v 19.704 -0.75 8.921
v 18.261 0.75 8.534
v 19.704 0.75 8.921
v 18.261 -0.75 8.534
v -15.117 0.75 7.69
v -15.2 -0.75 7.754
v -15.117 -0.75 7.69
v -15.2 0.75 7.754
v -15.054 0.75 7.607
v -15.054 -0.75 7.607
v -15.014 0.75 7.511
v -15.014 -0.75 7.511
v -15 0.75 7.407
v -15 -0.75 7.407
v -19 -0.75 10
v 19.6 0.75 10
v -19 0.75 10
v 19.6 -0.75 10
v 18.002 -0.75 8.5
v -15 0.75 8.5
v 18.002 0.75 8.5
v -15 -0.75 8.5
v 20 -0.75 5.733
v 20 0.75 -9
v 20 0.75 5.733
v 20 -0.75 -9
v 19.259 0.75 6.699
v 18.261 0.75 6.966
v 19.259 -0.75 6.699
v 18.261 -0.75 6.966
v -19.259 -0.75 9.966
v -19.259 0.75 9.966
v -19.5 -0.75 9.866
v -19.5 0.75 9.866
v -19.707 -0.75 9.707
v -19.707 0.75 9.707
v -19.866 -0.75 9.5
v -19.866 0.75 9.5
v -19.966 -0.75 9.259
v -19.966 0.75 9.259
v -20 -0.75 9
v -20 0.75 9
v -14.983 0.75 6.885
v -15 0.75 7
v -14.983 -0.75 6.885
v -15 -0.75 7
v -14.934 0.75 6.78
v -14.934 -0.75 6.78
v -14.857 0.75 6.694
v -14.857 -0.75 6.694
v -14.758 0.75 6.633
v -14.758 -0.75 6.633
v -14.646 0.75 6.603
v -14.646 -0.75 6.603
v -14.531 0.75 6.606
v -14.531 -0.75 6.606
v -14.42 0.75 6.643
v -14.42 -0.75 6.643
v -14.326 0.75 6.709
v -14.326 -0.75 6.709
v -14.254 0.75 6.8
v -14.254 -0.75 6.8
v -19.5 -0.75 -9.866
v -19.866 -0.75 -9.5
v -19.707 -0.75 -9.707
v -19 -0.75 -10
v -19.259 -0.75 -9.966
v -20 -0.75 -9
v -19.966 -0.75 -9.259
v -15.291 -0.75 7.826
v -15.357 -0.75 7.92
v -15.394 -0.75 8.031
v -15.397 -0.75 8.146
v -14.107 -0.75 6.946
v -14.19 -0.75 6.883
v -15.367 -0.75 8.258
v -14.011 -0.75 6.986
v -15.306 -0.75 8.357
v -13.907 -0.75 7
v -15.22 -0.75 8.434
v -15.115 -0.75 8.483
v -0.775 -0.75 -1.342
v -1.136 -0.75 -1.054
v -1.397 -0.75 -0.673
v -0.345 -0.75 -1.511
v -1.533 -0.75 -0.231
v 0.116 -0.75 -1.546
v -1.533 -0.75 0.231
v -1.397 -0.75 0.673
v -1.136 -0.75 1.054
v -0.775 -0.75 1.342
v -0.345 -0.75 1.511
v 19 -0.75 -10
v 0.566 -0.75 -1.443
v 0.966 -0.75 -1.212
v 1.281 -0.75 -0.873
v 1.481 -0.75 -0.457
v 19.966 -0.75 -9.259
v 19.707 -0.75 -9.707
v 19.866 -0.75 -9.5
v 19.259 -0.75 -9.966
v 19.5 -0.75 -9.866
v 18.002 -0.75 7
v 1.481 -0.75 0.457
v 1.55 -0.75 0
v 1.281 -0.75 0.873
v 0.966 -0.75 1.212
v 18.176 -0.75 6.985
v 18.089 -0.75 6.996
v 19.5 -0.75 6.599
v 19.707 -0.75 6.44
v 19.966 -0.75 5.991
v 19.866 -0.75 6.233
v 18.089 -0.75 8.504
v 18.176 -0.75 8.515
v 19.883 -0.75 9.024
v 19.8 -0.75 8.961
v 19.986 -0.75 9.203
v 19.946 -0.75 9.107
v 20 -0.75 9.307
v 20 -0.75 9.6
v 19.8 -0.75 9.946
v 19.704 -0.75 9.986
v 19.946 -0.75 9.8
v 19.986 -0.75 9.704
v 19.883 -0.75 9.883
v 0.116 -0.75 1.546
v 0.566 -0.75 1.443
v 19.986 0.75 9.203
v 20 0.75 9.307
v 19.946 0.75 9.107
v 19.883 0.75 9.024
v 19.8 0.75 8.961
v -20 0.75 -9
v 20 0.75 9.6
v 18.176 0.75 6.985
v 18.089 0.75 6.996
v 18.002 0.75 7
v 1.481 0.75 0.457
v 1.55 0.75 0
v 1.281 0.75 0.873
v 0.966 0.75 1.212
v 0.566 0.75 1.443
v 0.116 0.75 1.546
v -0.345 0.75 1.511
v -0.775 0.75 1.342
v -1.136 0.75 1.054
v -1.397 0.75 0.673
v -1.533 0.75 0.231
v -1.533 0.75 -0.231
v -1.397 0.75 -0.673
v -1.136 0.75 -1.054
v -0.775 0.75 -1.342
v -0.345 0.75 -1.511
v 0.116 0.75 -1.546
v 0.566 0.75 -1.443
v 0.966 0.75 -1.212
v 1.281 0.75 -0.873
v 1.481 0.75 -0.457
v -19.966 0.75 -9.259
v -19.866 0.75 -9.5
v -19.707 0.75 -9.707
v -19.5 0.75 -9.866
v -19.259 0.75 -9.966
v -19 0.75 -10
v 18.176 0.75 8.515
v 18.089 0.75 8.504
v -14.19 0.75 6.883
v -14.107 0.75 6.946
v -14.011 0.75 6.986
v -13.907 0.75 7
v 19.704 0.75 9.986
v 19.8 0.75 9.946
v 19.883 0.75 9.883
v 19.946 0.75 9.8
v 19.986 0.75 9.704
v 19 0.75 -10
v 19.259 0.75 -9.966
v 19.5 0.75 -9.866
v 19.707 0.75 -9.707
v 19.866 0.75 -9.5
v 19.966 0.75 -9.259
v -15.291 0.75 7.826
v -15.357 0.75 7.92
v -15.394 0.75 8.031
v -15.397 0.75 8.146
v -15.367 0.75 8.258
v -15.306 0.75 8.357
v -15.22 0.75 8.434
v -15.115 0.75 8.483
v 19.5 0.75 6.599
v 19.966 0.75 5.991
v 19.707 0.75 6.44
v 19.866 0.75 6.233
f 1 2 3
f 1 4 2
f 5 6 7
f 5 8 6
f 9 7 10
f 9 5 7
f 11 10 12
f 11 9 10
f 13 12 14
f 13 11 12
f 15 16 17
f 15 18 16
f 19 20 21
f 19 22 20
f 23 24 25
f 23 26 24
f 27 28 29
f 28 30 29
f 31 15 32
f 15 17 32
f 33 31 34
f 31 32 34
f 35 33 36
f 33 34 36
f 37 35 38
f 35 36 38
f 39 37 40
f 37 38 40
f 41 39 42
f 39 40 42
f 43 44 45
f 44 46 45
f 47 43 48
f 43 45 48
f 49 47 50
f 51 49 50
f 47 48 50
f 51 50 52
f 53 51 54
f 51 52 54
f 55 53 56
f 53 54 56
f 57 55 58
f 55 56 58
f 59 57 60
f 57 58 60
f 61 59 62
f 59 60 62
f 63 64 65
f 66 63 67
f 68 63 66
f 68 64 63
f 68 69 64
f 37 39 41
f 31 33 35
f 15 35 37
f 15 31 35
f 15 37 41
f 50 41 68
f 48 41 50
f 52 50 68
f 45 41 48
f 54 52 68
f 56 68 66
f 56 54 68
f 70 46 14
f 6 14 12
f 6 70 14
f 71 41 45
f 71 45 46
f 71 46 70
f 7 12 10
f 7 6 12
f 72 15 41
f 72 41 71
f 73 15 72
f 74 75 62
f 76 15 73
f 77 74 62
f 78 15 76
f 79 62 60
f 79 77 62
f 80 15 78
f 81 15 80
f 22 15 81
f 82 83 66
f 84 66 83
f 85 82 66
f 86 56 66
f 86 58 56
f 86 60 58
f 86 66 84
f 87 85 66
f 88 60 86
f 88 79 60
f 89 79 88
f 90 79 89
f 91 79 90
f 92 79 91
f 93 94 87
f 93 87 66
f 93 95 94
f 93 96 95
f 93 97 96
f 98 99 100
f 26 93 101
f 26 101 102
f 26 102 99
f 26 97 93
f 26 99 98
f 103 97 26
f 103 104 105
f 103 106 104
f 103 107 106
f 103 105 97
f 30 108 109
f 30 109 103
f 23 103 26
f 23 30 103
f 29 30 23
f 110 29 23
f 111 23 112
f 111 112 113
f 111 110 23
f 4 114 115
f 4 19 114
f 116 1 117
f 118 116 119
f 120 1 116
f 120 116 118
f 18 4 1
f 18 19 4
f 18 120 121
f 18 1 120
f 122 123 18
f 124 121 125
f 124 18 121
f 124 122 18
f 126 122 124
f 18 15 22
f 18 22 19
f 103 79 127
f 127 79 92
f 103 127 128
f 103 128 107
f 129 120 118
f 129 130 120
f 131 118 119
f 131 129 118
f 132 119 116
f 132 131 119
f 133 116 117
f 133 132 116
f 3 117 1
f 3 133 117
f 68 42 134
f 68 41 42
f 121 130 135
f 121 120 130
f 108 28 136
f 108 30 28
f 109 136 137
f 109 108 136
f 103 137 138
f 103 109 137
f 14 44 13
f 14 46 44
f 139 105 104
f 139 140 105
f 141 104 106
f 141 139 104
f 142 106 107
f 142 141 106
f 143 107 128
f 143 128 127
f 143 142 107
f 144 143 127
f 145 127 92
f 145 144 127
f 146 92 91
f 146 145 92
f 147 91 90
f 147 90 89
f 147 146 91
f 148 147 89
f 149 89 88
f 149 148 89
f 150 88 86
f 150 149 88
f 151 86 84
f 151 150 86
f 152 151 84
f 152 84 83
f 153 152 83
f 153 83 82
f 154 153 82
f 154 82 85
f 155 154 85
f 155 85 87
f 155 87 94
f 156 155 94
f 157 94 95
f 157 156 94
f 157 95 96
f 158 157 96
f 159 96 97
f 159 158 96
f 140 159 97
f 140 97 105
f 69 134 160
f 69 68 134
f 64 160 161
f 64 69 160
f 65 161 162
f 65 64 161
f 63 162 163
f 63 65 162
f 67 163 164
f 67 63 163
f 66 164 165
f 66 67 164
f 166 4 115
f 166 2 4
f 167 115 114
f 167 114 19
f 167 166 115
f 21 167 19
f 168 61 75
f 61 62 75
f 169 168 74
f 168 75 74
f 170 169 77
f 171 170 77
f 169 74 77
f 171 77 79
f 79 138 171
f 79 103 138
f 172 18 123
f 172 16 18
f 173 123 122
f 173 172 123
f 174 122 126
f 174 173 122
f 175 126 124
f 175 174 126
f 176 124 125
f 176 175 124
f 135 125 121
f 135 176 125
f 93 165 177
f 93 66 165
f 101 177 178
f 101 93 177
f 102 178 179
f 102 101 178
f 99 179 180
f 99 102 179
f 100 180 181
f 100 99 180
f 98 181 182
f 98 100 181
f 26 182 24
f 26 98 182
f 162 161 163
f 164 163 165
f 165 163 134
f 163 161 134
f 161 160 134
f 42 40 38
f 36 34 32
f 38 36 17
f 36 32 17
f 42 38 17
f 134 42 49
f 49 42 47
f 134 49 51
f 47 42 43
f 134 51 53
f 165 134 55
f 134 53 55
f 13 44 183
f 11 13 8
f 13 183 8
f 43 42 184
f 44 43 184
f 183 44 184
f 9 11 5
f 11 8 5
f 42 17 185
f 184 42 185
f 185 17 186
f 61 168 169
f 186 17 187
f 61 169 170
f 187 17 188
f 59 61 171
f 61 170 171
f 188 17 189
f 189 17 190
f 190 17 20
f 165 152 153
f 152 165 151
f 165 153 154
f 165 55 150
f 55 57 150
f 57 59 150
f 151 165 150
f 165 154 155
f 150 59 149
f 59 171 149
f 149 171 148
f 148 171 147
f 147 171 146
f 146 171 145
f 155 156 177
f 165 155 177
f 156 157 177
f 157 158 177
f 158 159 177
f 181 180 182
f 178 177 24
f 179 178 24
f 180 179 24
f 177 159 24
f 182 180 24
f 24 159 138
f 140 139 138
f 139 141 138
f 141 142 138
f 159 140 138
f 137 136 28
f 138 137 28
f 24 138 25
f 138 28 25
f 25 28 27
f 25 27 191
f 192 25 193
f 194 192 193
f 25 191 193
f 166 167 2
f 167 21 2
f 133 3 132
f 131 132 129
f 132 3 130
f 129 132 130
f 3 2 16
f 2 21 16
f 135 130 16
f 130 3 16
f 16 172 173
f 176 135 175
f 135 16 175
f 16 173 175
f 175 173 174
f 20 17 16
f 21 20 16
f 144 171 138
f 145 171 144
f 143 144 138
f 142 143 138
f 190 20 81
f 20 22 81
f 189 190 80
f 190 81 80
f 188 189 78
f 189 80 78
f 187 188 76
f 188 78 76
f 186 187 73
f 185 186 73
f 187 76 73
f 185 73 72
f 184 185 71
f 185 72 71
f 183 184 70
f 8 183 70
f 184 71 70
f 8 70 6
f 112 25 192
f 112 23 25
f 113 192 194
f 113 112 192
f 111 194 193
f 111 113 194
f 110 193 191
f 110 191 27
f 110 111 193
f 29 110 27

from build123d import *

# Parameters (mm, degrees)
SKETCH015_R  = 1.55
PAD012_DEPTH = 0.75
FILLET016_R  = 0.4
FILLET017_R  = 1


with BuildPart() as part:
    # Sketch015 → Pad012 (new body, symmetric)
    with BuildSketch(Plane.XZ):
        with BuildLine():
            Line((-20, 10), (-20, -7))
            Line((-20, -8.5), (-20, -7))
            Line((-20, -8.5), (-20, -10))
            Line((-20, -10), (20, -10))
            Line((20, -10), (20, 6.5))
            Line((18.133975, 7), (20, 6.5))
            Line((18.133975, 7), (-14.2, 7))
            ThreePointArc((-15, 7), (-14.6, 6.6), (-14.2, 7))
            Line((-15, 7), (-15, 7.7))
            ThreePointArc((-15, 8.5), (-15.4, 8.1), (-15, 7.7))
            Line((-15, 8.5), (18.133975, 8.5))
            Line((18.133975, 8.5), (20, 9))
            Line((20, 9), (20, 10))
            Line((20, 10), (-20, 10))
        make_face()
        Circle(SKETCH015_R, mode=Mode.SUBTRACT)
    extrude(amount=PAD012_DEPTH, both=True)

    # Fillet016
    fillet016_edges = [part.edges().sort_by_distance(p)[0] for p in [
        (-15, 0, 7.7),
        (-14.2, 0, 7),
        (20, 0, 9),
        (20, 0, 10),
    ]]
    fillet(fillet016_edges, radius=FILLET016_R)

    # Fillet017
    fillet017_edges = [part.edges().sort_by_distance(p)[0] for p in [
        (-20, 0, 10),
        (-20, 0, -10),
        (20, 0, -10),
        (20, 0, 6.5),
        (18.133975, 0, 7),
        (18.133975, 0, 8.5),
    ]]
    fillet(fillet017_edges, radius=FILLET017_R)


solid = part.part
